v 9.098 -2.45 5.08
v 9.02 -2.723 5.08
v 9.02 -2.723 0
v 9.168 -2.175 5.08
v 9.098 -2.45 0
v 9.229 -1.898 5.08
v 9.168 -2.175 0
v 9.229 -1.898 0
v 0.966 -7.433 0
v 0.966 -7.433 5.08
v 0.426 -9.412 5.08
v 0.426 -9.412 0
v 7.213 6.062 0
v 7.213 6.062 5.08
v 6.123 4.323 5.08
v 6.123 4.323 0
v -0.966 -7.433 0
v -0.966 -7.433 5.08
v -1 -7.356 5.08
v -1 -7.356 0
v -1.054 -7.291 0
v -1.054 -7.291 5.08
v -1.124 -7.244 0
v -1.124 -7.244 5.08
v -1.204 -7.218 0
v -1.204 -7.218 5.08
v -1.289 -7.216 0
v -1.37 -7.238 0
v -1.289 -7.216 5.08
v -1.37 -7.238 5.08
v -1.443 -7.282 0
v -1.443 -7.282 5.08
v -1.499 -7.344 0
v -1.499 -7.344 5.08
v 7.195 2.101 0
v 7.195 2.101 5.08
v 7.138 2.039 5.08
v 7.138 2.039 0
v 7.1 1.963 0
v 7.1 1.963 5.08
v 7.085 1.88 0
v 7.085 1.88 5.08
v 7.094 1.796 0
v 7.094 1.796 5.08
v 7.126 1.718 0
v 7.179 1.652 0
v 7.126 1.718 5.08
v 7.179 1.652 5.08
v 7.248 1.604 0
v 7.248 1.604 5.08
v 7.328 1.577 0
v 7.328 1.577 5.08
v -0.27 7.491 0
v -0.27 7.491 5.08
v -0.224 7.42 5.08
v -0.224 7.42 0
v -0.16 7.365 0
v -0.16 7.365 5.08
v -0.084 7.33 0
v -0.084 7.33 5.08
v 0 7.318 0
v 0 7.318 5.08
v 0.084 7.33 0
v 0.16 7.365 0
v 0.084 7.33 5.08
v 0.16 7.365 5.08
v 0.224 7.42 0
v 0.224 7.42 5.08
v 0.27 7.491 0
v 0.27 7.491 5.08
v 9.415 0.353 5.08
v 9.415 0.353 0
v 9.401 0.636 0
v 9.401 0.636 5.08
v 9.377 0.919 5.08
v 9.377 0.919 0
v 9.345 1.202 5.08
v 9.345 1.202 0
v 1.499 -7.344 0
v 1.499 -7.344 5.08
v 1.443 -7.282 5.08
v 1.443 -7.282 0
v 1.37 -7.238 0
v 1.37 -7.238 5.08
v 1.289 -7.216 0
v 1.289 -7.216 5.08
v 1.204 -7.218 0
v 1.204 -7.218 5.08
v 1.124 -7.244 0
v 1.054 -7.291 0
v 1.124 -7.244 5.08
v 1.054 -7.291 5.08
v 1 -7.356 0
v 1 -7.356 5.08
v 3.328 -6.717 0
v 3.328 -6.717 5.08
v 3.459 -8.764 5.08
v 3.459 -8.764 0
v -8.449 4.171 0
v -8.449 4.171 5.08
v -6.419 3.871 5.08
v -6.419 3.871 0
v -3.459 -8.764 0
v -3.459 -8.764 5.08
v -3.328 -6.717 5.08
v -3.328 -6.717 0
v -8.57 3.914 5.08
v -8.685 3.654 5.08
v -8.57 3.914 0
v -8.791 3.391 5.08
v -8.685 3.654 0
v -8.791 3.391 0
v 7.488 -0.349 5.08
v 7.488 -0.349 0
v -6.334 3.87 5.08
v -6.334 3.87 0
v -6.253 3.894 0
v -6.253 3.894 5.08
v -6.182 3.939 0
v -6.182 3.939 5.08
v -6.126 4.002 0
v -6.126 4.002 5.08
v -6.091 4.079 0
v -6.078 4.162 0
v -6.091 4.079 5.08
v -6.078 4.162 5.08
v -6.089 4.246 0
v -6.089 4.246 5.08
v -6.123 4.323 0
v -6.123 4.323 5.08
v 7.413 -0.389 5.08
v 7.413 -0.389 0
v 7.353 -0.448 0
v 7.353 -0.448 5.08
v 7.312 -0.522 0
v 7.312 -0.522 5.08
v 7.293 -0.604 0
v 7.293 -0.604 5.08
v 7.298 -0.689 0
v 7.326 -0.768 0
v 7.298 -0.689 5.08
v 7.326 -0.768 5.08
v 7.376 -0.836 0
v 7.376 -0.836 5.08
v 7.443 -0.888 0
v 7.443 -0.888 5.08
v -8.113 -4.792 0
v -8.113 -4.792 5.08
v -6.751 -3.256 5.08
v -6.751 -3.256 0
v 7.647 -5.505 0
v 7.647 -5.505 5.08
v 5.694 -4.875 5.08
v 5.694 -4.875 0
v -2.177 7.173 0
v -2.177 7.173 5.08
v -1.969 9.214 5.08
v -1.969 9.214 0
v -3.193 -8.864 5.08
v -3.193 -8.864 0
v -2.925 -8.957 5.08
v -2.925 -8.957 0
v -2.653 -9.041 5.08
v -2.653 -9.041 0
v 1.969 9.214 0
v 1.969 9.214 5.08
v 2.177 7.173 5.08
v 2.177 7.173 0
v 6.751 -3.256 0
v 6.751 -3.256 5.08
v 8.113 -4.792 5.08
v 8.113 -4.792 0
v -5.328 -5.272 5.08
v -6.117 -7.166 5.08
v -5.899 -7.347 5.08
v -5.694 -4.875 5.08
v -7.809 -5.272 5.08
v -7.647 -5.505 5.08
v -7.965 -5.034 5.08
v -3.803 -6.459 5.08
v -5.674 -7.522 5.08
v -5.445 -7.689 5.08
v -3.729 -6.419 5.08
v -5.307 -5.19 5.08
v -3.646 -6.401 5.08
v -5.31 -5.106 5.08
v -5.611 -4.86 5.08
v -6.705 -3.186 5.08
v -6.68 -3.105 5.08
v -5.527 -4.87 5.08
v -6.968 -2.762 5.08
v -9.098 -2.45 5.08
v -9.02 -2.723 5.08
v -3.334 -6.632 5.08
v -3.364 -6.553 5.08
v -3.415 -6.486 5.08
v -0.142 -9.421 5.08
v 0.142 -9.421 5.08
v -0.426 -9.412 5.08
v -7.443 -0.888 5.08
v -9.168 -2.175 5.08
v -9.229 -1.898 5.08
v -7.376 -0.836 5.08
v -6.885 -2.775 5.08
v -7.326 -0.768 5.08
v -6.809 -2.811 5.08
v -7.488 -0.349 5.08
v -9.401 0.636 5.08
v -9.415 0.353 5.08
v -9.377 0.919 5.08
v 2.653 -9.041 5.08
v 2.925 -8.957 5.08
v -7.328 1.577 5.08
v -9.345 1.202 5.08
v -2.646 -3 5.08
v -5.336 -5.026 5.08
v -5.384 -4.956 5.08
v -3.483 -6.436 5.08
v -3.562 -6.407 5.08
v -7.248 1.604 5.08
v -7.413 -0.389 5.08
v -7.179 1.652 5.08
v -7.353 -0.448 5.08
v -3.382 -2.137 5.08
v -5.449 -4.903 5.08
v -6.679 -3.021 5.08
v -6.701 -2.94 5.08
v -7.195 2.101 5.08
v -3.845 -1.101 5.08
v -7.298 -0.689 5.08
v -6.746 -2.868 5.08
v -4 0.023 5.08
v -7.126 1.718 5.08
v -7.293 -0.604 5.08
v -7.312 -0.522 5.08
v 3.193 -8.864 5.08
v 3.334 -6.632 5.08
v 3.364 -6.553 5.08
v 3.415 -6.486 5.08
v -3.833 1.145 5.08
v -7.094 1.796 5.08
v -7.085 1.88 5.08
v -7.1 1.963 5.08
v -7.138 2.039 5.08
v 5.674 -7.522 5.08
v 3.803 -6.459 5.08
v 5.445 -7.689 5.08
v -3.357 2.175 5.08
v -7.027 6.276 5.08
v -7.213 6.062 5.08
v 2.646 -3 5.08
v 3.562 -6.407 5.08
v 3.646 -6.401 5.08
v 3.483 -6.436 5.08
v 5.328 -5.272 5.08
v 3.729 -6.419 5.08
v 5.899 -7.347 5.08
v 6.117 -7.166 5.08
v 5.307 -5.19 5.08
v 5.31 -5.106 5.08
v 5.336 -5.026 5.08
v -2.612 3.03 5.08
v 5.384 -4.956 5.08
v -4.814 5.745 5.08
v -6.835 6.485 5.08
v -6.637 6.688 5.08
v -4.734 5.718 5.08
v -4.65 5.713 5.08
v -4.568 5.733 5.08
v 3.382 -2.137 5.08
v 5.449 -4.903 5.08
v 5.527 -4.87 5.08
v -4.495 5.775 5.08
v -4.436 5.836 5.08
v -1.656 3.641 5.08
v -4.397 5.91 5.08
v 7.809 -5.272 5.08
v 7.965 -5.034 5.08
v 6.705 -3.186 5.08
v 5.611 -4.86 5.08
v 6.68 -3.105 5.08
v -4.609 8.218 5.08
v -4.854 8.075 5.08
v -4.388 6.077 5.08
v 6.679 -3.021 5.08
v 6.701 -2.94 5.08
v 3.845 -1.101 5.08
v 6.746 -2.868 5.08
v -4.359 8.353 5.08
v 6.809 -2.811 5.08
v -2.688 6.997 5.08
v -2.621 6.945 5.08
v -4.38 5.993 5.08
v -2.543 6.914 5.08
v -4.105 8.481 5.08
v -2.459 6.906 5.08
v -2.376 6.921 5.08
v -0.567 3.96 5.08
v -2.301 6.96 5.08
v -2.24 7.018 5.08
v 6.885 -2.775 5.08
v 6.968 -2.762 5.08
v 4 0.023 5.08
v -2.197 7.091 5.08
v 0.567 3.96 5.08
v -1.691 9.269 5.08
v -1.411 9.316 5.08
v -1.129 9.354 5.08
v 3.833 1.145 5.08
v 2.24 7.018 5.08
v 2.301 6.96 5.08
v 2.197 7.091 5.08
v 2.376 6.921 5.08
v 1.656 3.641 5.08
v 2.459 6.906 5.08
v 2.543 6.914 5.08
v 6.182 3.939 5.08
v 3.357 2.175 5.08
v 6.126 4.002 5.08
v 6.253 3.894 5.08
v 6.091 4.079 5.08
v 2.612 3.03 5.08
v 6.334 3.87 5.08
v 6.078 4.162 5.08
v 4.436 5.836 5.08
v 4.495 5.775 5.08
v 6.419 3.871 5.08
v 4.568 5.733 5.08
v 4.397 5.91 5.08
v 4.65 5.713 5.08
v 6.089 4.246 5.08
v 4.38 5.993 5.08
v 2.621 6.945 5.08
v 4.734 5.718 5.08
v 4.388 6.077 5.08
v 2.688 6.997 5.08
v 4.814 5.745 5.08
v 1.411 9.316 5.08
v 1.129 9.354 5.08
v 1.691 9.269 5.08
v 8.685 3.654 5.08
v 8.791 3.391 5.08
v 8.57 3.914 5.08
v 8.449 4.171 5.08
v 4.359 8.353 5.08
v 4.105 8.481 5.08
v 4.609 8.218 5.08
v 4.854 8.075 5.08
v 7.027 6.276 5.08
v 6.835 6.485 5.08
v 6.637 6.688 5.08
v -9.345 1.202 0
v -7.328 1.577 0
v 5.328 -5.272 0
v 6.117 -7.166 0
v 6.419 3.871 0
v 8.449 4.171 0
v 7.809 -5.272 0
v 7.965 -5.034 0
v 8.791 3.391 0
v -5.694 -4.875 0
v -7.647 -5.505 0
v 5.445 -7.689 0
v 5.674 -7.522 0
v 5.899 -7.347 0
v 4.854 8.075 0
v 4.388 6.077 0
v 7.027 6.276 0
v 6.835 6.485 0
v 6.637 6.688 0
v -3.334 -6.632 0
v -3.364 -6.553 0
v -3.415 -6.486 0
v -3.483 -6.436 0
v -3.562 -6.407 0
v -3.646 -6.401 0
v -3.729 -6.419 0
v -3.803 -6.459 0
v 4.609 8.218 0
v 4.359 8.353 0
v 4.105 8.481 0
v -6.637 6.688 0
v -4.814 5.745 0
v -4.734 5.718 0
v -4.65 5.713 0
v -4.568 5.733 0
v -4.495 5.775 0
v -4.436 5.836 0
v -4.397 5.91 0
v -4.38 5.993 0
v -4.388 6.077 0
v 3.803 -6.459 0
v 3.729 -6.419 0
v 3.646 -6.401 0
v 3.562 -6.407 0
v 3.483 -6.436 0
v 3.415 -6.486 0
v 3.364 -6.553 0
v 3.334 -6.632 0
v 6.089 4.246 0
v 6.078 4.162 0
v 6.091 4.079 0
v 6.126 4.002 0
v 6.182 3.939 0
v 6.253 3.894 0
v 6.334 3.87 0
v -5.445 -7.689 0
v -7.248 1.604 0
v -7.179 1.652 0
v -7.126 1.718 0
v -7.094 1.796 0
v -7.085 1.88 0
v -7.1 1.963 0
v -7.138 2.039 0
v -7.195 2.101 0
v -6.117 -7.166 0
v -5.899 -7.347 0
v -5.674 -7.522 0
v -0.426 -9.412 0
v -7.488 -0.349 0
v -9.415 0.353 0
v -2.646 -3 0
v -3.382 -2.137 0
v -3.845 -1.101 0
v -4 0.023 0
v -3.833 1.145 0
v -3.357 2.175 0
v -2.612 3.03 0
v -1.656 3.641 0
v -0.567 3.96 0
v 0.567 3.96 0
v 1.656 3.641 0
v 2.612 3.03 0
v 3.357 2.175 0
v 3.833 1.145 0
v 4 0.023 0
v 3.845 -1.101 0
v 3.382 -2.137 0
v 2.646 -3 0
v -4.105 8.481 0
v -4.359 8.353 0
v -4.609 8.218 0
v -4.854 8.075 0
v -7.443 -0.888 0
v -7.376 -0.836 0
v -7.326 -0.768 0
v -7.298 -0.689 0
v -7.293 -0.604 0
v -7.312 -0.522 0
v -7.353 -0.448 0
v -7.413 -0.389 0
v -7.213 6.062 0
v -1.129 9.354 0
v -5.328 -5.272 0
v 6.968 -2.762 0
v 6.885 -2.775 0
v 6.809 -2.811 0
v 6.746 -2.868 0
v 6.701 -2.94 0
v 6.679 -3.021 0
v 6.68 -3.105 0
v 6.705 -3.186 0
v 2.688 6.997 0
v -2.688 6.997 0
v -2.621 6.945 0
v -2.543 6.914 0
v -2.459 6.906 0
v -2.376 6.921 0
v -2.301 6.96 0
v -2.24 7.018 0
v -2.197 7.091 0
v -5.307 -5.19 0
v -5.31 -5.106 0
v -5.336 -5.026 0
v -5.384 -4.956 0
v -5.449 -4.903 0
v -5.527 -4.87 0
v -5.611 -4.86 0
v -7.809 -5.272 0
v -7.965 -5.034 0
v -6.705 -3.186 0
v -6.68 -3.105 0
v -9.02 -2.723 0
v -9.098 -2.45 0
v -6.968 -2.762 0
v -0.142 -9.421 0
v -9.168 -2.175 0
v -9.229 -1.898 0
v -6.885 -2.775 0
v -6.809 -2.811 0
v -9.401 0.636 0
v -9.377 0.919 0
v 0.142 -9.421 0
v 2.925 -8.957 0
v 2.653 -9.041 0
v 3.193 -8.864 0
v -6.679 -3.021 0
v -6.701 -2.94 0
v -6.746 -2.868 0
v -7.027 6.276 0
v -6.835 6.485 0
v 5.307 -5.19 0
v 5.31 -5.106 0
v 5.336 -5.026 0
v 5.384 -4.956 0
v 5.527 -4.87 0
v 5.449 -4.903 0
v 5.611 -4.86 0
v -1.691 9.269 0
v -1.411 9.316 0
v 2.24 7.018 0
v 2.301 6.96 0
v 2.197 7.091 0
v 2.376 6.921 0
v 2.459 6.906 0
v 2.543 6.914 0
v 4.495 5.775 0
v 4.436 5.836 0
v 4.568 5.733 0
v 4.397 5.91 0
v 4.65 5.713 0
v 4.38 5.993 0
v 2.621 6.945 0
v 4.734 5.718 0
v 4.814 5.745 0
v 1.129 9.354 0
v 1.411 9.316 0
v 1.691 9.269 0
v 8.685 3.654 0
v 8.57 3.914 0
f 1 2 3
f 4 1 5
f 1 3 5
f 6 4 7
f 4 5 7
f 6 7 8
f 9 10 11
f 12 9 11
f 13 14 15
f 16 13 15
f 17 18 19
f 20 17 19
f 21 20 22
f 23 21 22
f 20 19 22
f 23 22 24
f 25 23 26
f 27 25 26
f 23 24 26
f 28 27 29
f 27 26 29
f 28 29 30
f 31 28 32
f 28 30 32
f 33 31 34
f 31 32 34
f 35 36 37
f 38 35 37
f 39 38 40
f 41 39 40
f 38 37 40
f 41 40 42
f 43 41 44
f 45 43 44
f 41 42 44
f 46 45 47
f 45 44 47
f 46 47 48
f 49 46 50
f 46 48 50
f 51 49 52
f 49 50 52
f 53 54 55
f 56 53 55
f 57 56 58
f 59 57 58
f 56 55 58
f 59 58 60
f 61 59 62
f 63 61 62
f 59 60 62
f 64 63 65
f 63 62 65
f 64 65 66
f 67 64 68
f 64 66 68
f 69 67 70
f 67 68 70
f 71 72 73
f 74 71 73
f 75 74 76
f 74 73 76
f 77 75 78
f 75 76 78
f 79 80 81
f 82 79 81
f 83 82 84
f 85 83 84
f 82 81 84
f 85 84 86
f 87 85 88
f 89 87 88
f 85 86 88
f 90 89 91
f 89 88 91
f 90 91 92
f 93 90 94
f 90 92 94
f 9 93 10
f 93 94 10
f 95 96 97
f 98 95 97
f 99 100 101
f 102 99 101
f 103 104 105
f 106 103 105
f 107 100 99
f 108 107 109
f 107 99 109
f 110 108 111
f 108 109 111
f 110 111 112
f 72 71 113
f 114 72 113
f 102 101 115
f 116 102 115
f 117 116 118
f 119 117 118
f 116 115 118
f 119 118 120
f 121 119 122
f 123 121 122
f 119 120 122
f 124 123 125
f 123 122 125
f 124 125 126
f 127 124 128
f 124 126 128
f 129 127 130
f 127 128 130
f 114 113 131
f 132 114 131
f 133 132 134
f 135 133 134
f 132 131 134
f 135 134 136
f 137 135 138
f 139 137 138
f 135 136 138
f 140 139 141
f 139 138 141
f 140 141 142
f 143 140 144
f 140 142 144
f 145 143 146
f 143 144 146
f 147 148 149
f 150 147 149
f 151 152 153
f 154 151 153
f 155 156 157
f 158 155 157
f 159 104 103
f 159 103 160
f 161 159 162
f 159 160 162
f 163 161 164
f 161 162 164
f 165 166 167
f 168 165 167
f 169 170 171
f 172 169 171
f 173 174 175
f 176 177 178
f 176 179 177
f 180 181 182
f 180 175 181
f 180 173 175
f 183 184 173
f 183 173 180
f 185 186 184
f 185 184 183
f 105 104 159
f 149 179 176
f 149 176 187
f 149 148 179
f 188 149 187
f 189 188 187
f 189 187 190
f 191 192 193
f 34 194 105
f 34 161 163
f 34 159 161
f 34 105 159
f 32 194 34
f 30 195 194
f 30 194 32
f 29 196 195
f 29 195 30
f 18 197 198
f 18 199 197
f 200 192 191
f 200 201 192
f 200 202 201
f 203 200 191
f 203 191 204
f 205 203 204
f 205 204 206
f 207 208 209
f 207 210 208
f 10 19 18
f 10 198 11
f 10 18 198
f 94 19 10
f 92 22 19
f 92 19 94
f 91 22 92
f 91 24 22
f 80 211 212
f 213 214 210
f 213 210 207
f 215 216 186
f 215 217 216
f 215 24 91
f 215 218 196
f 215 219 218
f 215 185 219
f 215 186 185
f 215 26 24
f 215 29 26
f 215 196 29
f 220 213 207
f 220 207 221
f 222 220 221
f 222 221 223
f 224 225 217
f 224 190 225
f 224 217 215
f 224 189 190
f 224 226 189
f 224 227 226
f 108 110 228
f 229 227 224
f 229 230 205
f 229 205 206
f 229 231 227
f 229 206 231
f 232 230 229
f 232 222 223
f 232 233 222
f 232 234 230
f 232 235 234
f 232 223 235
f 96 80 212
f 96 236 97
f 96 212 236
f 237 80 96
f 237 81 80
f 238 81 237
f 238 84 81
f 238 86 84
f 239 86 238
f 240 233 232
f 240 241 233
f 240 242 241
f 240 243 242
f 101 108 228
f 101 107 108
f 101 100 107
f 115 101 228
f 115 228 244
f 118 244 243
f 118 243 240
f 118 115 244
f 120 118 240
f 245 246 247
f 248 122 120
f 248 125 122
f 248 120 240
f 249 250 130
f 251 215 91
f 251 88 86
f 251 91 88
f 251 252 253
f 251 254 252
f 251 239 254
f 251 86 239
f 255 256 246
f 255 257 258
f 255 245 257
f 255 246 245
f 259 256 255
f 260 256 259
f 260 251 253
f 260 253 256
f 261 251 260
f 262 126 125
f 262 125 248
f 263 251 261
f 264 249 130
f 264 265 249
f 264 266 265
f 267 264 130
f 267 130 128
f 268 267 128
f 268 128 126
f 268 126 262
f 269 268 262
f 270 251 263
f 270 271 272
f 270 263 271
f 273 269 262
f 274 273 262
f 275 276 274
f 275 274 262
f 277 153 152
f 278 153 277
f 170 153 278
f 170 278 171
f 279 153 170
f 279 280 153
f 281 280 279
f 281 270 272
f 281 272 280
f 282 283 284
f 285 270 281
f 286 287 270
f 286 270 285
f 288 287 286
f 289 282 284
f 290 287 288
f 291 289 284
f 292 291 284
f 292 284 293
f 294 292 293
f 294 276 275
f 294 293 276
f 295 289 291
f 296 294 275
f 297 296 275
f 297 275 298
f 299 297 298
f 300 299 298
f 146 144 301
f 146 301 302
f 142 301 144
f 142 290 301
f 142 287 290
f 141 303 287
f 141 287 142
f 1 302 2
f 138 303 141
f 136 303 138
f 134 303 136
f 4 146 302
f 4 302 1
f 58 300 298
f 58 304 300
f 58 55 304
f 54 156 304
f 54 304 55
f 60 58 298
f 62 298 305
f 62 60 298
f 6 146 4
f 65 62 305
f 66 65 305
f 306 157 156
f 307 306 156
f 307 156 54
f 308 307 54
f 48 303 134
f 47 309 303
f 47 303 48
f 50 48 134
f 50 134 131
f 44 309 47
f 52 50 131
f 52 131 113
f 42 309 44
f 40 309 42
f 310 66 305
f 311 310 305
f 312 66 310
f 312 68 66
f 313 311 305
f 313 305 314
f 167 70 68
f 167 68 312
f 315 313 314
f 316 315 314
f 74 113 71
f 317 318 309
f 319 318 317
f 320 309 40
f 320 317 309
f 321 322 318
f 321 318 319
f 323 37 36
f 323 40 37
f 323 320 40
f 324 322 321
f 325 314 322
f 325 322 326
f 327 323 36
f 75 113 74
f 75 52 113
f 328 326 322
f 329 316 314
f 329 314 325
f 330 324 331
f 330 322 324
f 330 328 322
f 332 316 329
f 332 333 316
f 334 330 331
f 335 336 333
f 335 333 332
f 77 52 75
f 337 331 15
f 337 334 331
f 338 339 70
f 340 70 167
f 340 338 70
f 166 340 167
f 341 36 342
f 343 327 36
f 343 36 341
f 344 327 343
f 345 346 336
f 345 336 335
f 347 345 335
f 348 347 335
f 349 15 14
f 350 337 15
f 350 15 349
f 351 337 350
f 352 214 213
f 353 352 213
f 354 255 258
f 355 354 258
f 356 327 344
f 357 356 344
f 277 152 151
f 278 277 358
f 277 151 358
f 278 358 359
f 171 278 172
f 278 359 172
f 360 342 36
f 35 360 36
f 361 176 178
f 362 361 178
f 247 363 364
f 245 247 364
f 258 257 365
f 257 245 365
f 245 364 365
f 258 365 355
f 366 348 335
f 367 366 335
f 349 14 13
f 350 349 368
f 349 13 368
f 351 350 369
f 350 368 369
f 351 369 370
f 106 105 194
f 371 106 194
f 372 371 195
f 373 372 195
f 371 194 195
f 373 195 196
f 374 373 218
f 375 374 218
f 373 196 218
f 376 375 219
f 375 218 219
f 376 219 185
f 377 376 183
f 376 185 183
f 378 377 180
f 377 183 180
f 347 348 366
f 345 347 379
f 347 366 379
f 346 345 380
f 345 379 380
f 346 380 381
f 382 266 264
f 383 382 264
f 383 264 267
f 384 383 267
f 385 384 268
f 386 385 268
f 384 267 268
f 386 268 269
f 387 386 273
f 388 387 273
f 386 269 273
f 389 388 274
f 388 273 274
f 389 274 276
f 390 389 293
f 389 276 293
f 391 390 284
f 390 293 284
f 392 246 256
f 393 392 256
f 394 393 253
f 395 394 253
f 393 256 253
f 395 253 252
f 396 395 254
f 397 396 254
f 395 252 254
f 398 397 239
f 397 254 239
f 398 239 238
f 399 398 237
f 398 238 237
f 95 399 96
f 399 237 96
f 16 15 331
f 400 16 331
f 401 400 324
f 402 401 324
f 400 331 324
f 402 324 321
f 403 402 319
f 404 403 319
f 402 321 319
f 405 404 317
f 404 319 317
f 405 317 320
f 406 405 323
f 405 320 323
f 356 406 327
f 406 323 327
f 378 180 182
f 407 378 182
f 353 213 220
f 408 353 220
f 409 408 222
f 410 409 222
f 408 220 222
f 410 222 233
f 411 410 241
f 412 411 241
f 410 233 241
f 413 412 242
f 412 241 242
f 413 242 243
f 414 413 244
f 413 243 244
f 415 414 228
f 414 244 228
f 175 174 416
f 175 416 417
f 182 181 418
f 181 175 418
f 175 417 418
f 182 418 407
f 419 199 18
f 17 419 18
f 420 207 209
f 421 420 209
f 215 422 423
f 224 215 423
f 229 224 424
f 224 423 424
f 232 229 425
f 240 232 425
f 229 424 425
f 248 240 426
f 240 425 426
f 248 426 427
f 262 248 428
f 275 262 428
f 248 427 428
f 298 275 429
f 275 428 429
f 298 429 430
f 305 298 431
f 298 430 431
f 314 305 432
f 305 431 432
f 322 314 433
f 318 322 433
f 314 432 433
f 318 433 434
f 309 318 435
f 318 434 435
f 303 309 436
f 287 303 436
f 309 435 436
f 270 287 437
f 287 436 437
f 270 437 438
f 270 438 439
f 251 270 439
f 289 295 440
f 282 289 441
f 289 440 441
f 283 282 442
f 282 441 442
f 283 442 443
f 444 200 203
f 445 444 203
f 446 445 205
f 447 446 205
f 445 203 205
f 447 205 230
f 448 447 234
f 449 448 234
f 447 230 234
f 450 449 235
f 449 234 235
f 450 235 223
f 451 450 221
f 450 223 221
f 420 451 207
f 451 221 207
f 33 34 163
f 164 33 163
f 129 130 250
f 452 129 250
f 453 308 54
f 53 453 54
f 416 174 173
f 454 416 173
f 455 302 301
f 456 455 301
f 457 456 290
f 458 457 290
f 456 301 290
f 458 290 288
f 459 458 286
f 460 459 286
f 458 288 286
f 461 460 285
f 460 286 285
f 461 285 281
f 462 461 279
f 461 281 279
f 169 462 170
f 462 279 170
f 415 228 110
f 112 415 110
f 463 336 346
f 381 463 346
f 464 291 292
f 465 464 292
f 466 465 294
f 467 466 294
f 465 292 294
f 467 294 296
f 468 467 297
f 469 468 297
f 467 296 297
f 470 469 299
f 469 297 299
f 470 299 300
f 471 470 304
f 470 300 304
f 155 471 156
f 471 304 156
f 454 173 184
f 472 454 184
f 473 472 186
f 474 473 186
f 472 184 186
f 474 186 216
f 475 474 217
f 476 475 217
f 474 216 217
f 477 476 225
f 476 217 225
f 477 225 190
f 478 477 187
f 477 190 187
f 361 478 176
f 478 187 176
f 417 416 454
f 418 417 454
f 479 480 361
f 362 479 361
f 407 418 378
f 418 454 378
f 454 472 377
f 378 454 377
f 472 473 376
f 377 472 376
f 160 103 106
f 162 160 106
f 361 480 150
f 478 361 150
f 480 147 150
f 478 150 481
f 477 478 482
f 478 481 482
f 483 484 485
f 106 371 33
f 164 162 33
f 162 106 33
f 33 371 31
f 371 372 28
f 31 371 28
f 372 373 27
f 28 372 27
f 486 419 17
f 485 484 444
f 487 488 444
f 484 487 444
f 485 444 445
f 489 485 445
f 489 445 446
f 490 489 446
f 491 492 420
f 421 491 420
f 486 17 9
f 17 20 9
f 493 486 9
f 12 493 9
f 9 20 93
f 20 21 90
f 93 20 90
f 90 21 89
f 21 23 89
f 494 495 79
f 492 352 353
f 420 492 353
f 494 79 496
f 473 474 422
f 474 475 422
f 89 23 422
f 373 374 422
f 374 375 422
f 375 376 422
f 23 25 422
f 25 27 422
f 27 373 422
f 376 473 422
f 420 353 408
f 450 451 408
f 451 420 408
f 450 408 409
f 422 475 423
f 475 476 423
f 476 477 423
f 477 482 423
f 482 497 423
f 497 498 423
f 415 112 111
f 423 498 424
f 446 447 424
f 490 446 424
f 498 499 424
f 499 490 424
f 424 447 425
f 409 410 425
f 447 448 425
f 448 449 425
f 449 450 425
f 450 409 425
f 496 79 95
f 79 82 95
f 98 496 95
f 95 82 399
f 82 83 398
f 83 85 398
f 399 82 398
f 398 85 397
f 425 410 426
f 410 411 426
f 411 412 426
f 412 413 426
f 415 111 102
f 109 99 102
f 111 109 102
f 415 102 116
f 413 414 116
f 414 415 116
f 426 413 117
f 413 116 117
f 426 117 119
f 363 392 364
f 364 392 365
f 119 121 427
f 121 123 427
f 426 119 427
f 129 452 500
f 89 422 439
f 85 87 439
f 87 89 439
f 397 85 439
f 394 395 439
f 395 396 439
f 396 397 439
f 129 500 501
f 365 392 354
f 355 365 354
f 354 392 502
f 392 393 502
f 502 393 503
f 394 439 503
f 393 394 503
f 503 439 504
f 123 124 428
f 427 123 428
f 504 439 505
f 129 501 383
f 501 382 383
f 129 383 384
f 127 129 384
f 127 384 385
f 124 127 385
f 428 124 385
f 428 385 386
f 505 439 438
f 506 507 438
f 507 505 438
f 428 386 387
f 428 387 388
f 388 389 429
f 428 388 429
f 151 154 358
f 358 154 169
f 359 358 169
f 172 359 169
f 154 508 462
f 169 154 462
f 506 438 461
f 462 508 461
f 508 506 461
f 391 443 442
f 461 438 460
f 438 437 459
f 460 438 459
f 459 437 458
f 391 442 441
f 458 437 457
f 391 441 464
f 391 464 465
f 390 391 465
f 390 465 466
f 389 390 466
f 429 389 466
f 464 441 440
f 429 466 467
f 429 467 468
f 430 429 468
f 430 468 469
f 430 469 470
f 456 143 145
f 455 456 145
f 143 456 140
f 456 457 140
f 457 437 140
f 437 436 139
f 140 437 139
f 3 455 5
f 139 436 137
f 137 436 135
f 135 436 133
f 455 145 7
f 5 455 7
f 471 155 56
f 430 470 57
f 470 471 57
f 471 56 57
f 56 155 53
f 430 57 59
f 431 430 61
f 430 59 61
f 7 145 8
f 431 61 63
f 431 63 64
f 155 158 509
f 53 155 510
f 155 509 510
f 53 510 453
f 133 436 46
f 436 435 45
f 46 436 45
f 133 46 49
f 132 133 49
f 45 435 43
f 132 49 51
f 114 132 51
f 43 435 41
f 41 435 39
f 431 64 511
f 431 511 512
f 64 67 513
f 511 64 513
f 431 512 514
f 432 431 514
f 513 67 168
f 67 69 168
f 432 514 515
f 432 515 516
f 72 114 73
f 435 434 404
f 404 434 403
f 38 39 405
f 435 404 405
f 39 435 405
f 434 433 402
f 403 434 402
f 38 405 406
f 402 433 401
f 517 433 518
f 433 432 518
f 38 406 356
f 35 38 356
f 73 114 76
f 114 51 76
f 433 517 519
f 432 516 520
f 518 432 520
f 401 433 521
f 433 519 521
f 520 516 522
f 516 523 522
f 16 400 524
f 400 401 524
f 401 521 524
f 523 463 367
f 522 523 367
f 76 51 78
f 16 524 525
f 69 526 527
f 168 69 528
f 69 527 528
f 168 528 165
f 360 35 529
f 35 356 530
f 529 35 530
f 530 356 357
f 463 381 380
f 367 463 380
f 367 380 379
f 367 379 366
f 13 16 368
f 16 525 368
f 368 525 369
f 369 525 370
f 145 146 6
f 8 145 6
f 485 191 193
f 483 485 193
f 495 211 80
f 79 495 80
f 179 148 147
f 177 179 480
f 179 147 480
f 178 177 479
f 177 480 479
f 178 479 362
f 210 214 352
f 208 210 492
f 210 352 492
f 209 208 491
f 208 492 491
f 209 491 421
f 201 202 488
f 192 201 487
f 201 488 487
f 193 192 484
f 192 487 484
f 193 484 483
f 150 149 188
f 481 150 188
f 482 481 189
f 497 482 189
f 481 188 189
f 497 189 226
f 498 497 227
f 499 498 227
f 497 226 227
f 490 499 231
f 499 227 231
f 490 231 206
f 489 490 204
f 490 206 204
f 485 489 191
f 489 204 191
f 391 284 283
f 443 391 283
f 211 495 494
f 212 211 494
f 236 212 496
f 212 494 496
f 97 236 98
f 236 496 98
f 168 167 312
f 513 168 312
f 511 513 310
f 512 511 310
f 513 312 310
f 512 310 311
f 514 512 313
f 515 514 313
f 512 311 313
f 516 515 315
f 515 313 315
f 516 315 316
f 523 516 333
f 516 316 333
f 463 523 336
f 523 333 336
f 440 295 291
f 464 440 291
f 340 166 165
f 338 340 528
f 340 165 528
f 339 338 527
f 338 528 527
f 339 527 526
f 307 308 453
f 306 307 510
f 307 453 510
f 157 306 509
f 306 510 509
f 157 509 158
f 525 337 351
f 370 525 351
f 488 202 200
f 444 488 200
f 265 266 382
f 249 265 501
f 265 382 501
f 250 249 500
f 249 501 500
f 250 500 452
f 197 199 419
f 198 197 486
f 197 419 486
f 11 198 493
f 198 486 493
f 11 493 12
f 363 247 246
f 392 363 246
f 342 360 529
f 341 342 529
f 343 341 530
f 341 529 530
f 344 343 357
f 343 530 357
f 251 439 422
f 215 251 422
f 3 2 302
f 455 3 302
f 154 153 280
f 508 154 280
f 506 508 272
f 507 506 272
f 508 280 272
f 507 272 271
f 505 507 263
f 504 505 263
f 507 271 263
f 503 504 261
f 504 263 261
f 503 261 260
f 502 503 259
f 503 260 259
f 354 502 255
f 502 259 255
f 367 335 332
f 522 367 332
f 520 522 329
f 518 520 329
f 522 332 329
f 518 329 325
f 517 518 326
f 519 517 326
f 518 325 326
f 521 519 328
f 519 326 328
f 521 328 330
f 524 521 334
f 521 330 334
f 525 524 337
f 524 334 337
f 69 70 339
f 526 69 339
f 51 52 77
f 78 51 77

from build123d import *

# Parameters (mm, degrees)
F0_R            = 9.4221007419
F1_DEPTH        = 5.08
F3_DEPTH        = 5.08
F3_COPIES_COUNT = 19


# Not quite as in the source:
# - a pattern or mirror of a feature is missing from the dataset's text; its kind, count and spacing are read off the source's solid
# - a feature names something its author has since deleted; it is built from what else it names


with BuildPart() as f1:
    # F0 (on Top) → F1 (new body)
    with BuildSketch(Plane.XY):
        Circle(F0_R)
        with BuildLine():
            ThreePointArc((-2.6457529, -2.9999985987), (0, 4), (2.6457529, -2.9999985987))
            Line((2.6457529, -2.9999985987), (-2.6457529, -2.9999985987))
        make_face(mode=Mode.SUBTRACT)
    extrude(amount=F1_DEPTH)

    # F2 (on face) → F3 (cut, through all)
    with BuildSketch(Plane.XY.offset(5.08)):
        with BuildLine():
            Line((0.2702110818, 7.4907975301), (1.1292079793, 9.3541900628))
            ThreePointArc((1.1292079793, 9.3541900628), (0, 9.4221007419), (-1.1292079793, 9.3541900628))
            Line((-1.1292079793, 9.3541900628), (-0.2702110818, 7.4907975301))
            ThreePointArc((-0.2702110818, 7.4907975301), (0, 7.3178208914), (0.2702110818, 7.4907975301))
        make_face()
    f3 = extrude(amount=-F3_DEPTH, mode=Mode.SUBTRACT)

    # F3_copies: F3 ×19 about axis
    f3_copies_axis = Axis((0, 0, 0), (0, 0, 1))
    for i in range(1, F3_COPIES_COUNT):
        add(f3.rotate(f3_copies_axis, i * 360 / F3_COPIES_COUNT), mode=Mode.SUBTRACT)


solid = f1.part
